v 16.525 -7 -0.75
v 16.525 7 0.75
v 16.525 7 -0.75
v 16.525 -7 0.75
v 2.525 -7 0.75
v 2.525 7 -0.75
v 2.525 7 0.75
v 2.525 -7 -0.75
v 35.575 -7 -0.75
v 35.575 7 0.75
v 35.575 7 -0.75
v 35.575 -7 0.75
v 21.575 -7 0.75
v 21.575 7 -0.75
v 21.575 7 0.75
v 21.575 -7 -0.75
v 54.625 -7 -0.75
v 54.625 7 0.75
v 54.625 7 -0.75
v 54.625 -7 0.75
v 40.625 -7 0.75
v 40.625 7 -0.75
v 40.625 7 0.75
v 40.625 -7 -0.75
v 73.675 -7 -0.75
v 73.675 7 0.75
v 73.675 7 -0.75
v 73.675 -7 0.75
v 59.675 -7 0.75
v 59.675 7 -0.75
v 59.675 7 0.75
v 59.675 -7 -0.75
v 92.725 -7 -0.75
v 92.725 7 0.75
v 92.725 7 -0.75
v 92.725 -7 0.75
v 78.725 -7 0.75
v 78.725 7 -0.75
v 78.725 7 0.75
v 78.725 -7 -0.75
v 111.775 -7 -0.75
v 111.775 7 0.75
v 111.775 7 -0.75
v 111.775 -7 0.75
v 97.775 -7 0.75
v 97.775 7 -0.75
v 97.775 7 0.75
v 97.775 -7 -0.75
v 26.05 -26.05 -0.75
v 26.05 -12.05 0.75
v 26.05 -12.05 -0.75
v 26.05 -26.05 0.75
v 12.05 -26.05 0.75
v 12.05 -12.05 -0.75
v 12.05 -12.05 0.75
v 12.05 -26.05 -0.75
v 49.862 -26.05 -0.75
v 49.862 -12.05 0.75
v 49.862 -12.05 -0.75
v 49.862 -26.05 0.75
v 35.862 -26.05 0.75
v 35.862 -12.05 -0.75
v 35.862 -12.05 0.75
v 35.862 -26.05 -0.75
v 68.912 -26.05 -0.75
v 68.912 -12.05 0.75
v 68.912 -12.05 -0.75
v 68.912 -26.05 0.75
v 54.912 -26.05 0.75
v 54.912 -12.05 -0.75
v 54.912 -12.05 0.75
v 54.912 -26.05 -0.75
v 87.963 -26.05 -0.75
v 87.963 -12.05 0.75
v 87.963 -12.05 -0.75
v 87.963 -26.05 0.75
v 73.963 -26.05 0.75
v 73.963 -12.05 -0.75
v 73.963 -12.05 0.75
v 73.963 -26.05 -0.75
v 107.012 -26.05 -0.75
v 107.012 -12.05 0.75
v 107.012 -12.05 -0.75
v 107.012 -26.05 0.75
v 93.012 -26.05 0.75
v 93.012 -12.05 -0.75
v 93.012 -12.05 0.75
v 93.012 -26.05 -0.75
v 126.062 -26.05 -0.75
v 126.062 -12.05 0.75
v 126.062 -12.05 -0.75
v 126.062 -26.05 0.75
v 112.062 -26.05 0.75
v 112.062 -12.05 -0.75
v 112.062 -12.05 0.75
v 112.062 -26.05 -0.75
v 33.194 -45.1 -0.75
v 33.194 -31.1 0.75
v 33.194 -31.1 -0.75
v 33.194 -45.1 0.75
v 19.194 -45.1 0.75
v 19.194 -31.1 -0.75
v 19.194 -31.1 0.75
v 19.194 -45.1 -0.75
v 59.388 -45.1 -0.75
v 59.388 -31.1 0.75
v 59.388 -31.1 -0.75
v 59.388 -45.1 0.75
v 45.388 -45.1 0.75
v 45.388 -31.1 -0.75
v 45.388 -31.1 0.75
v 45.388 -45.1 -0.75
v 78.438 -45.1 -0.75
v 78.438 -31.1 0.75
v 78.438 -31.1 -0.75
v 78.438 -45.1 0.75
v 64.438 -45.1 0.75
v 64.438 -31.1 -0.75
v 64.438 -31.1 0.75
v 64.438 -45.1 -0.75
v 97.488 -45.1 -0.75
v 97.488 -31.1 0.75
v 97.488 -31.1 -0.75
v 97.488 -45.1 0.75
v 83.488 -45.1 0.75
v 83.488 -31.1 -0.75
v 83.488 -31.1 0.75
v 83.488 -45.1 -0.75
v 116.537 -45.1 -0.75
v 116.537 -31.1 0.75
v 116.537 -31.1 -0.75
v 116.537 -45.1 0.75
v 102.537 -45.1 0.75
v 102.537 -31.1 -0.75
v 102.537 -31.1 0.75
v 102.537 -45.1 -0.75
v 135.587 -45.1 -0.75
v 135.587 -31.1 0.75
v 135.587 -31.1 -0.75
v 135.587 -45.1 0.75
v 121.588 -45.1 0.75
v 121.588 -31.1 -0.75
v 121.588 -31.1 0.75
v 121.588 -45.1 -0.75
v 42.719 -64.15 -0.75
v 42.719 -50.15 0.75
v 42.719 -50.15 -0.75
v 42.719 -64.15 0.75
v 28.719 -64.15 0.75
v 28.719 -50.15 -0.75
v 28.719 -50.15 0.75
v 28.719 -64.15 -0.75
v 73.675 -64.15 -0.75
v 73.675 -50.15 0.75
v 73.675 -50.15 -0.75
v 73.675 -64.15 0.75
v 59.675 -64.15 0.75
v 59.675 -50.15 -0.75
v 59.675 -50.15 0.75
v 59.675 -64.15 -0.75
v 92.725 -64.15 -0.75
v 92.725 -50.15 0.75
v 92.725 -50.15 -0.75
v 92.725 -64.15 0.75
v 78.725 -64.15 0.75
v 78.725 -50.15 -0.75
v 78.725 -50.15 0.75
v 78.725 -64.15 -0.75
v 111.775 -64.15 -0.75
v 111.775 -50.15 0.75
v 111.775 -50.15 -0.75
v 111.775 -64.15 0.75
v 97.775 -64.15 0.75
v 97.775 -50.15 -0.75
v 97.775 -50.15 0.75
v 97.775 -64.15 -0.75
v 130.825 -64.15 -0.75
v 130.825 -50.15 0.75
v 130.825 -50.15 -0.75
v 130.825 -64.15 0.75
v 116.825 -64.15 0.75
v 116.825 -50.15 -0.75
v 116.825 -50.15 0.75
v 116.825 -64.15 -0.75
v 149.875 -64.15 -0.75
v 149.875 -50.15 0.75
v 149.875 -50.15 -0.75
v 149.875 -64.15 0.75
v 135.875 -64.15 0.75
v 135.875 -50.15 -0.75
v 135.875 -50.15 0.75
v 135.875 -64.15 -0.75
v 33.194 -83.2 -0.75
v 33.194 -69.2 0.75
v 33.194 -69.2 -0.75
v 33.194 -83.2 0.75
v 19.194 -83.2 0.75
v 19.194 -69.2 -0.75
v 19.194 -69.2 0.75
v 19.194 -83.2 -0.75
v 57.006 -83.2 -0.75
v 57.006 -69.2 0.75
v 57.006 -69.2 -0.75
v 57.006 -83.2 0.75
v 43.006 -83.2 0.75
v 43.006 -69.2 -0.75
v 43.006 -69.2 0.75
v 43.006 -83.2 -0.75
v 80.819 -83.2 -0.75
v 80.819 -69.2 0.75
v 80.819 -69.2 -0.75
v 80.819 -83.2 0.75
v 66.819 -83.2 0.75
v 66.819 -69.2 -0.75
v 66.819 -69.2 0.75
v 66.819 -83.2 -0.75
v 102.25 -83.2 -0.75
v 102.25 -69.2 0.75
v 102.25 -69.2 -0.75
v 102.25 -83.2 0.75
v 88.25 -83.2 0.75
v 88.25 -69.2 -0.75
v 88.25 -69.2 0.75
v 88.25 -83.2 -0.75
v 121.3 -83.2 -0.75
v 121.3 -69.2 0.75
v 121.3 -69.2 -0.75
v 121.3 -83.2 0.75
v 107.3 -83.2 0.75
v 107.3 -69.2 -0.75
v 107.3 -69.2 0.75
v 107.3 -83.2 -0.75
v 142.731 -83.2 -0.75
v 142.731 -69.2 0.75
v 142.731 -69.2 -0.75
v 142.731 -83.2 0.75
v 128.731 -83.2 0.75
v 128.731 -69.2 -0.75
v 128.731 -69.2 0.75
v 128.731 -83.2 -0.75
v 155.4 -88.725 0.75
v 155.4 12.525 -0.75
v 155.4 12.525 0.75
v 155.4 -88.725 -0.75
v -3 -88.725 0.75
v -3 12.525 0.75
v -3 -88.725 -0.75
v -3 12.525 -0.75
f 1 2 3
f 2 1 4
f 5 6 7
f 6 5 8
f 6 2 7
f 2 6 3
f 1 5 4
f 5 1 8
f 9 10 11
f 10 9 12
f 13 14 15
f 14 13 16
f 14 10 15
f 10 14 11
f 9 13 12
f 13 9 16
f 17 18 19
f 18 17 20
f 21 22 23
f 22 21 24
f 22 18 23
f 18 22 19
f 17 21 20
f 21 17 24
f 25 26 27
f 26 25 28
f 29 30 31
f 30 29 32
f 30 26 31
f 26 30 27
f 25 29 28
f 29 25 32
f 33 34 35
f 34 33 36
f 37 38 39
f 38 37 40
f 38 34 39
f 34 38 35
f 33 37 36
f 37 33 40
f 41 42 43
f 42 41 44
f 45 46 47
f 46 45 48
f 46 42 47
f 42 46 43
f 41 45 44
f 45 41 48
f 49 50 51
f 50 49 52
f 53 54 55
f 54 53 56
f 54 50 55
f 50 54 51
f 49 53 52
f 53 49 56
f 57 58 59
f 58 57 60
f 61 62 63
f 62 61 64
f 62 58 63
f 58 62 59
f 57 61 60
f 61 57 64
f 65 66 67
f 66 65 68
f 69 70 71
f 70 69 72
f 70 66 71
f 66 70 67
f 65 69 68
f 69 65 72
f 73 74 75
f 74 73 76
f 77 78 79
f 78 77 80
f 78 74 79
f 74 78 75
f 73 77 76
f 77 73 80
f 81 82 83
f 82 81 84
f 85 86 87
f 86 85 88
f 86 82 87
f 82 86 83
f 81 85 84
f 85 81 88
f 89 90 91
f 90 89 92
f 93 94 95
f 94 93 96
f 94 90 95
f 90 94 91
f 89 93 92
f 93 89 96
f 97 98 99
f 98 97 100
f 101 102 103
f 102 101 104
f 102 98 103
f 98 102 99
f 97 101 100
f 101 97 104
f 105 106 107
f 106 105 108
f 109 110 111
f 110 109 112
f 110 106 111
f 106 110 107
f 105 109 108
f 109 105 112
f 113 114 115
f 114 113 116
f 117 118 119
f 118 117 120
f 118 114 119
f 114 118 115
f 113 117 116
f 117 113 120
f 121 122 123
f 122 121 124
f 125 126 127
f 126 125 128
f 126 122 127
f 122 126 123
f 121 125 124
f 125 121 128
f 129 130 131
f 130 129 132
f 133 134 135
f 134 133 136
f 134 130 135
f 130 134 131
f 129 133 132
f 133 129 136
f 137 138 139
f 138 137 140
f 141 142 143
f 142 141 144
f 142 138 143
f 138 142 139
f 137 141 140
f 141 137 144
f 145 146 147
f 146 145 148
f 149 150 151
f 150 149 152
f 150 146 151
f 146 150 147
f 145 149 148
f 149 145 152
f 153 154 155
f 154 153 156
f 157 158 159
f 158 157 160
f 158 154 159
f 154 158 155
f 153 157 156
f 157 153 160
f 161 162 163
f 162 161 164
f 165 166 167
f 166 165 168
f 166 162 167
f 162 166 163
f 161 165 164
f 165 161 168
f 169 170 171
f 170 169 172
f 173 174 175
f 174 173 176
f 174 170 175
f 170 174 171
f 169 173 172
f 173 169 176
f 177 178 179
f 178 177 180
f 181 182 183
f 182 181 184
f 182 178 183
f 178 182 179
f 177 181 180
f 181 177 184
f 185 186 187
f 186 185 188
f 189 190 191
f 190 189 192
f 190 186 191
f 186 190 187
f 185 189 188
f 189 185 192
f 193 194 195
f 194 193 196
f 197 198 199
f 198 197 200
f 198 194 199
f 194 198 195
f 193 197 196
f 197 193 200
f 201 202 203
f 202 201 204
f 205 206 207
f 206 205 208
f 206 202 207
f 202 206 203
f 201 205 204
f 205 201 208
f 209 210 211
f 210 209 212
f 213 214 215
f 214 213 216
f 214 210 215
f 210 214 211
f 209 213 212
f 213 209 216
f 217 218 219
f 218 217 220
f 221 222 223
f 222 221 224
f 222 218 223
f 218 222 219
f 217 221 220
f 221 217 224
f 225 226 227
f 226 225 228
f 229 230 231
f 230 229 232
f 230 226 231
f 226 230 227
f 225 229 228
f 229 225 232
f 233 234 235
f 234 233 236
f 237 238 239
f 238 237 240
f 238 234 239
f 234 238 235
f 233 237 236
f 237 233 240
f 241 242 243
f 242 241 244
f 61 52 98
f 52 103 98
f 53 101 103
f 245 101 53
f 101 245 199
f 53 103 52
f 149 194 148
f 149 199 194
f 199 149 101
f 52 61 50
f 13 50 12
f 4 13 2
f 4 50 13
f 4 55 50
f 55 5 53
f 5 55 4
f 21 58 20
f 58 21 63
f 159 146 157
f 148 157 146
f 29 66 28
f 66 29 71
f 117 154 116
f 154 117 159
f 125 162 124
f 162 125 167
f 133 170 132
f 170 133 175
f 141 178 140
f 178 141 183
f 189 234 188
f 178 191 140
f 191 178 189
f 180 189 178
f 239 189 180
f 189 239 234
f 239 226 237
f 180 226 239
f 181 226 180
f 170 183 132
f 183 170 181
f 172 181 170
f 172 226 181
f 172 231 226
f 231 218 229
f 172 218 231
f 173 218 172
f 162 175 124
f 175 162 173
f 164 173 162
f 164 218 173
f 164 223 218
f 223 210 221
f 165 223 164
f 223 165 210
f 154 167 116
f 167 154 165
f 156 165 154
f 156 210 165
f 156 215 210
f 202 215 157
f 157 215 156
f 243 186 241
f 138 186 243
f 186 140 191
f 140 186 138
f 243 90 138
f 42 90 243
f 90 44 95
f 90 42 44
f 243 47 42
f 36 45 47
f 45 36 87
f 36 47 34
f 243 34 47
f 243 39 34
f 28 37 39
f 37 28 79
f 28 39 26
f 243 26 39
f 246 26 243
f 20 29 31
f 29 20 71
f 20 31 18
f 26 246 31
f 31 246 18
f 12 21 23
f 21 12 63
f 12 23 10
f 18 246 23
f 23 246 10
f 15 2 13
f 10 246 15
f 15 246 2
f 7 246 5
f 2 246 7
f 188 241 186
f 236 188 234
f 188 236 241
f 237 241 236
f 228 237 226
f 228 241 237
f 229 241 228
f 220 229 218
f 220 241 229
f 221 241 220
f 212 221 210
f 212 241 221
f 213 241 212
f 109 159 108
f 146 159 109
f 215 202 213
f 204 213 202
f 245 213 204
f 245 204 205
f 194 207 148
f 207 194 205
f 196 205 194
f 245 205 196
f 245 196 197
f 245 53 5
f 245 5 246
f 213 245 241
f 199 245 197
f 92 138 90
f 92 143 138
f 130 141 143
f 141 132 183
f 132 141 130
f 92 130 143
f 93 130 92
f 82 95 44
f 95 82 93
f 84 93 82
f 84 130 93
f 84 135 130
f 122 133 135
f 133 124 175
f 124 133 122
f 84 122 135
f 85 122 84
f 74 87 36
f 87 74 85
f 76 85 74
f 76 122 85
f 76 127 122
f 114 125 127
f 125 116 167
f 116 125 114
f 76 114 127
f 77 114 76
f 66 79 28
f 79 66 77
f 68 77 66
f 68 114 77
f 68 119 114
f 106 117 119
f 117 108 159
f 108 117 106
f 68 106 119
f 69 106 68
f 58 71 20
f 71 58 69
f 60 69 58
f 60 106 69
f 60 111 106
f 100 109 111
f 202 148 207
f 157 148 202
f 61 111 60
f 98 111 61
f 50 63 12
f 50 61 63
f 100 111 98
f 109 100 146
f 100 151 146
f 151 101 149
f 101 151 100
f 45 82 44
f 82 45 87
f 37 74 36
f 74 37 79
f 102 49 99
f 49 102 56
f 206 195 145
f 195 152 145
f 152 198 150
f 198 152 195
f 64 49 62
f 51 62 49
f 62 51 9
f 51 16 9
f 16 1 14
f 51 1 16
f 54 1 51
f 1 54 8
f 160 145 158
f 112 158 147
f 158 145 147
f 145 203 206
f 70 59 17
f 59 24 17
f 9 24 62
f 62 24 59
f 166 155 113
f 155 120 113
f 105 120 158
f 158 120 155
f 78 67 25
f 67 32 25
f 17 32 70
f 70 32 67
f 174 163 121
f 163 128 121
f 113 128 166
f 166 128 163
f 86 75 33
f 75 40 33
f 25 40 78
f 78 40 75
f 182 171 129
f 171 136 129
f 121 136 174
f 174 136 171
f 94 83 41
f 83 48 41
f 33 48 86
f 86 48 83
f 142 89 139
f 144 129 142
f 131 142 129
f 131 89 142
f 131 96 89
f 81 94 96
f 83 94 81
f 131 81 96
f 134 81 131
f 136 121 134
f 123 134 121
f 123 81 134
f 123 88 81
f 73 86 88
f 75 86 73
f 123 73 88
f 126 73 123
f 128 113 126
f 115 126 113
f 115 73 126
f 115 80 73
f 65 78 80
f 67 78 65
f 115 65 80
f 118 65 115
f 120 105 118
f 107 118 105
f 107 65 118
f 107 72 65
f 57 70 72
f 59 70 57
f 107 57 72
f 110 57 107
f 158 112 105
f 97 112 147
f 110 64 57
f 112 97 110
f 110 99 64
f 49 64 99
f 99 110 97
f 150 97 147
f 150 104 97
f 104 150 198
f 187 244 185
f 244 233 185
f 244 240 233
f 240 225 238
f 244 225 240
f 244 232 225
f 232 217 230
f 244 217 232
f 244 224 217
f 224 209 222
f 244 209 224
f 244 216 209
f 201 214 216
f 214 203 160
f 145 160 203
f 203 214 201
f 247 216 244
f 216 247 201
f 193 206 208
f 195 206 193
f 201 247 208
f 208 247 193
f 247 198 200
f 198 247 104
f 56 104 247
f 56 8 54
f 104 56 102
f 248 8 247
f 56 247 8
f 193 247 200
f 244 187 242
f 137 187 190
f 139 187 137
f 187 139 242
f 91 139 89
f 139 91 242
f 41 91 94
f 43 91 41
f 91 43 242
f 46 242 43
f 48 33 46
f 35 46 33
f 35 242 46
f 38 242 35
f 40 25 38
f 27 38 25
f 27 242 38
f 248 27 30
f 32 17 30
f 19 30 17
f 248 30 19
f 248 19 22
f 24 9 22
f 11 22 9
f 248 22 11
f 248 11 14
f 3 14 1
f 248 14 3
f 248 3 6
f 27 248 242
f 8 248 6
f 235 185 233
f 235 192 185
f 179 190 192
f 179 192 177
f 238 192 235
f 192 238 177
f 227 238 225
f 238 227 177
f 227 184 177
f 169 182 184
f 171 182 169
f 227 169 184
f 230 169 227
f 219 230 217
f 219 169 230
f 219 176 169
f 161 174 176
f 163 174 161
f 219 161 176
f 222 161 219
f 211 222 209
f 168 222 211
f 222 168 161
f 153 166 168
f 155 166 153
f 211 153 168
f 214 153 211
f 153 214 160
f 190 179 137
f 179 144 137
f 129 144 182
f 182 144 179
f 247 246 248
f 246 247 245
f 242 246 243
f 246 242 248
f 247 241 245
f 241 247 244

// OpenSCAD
// Generated by SolidPython 1.1.3 on 2025-04-22 16:12:46


difference() {
	translate(v = [-3.0000000000, -88.7250000000, -0.7500000000]) {
		cube(size = [158.4000000000, 101.2500000000, 1.5000000000]);
	}
	union() {
		translate(v = [9.5250000000, 0.0000000000, 0]) {
			cube(center = true, size = [14.0000000000, 14.0000000000, 4.5000000000]);
		}
		translate(v = [28.5750000000, 0.0000000000, 0]) {
			cube(center = true, size = [14.0000000000, 14.0000000000, 4.5000000000]);
		}
		translate(v = [47.6250000000, 0.0000000000, 0]) {
			cube(center = true, size = [14.0000000000, 14.0000000000, 4.5000000000]);
		}
		translate(v = [66.6750000000, 0.0000000000, 0]) {
			cube(center = true, size = [14.0000000000, 14.0000000000, 4.5000000000]);
		}
		translate(v = [85.7250000000, 0.0000000000, 0]) {
			cube(center = true, size = [14.0000000000, 14.0000000000, 4.5000000000]);
		}
		translate(v = [104.7750000000, 0.0000000000, 0]) {
			cube(center = true, size = [14.0000000000, 14.0000000000, 4.5000000000]);
		}
		translate(v = [19.0500000000, -19.0500000000, 0]) {
			cube(center = true, size = [14.0000000000, 14.0000000000, 4.5000000000]);
		}
		translate(v = [42.8625000000, -19.0500000000, 0]) {
			cube(center = true, size = [14.0000000000, 14.0000000000, 4.5000000000]);
		}
		translate(v = [61.9125000000, -19.0500000000, 0]) {
			cube(center = true, size = [14.0000000000, 14.0000000000, 4.5000000000]);
		}
		translate(v = [80.9625000000, -19.0500000000, 0]) {
			cube(center = true, size = [14.0000000000, 14.0000000000, 4.5000000000]);
		}
		translate(v = [100.0125000000, -19.0500000000, 0]) {
			cube(center = true, size = [14.0000000000, 14.0000000000, 4.5000000000]);
		}
		translate(v = [119.0625000000, -19.0500000000, 0]) {
			cube(center = true, size = [14.0000000000, 14.0000000000, 4.5000000000]);
		}
		translate(v = [26.1937500000, -38.1000000000, 0]) {
			cube(center = true, size = [14.0000000000, 14.0000000000, 4.5000000000]);
		}
		translate(v = [52.3875000000, -38.1000000000, 0]) {
			cube(center = true, size = [14.0000000000, 14.0000000000, 4.5000000000]);
		}
		translate(v = [71.4375000000, -38.1000000000, 0]) {
			cube(center = true, size = [14.0000000000, 14.0000000000, 4.5000000000]);
		}
		translate(v = [90.4875000000, -38.1000000000, 0]) {
			cube(center = true, size = [14.0000000000, 14.0000000000, 4.5000000000]);
		}
		translate(v = [109.5375000000, -38.1000000000, 0]) {
			cube(center = true, size = [14.0000000000, 14.0000000000, 4.5000000000]);
		}
		translate(v = [128.5875000000, -38.1000000000, 0]) {
			cube(center = true, size = [14.0000000000, 14.0000000000, 4.5000000000]);
		}
		translate(v = [35.7187500000, -57.1500000000, 0]) {
			cube(center = true, size = [14.0000000000, 14.0000000000, 4.5000000000]);
		}
		translate(v = [66.6750000000, -57.1500000000, 0]) {
			cube(center = true, size = [14.0000000000, 14.0000000000, 4.5000000000]);
		}
		translate(v = [85.7250000000, -57.1500000000, 0]) {
			cube(center = true, size = [14.0000000000, 14.0000000000, 4.5000000000]);
		}
		translate(v = [104.7750000000, -57.1500000000, 0]) {
			cube(center = true, size = [14.0000000000, 14.0000000000, 4.5000000000]);
		}
		translate(v = [123.8250000000, -57.1500000000, 0]) {
			cube(center = true, size = [14.0000000000, 14.0000000000, 4.5000000000]);
		}
		translate(v = [142.8750000000, -57.1500000000, 0]) {
			cube(center = true, size = [14.0000000000, 14.0000000000, 4.5000000000]);
		}
		translate(v = [26.1937500000, -76.2000000000, 0]) {
			cube(center = true, size = [14.0000000000, 14.0000000000, 4.5000000000]);
		}
		translate(v = [50.0062500000, -76.2000000000, 0]) {
			cube(center = true, size = [14.0000000000, 14.0000000000, 4.5000000000]);
		}
		translate(v = [73.8187500000, -76.2000000000, 0]) {
			cube(center = true, size = [14.0000000000, 14.0000000000, 4.5000000000]);
		}
		translate(v = [95.2500000000, -76.2000000000, 0]) {
			cube(center = true, size = [14.0000000000, 14.0000000000, 4.5000000000]);
		}
		translate(v = [114.3000000000, -76.2000000000, 0]) {
			cube(center = true, size = [14.0000000000, 14.0000000000, 4.5000000000]);
		}
		translate(v = [135.7312500000, -76.2000000000, 0]) {
			cube(center = true, size = [14.0000000000, 14.0000000000, 4.5000000000]);
		}
	}
}
/***********************************************
*********      SolidPython code:      **********
************************************************
 
#! /usr/bin/env python
# -*- coding: utf-8 -*-

from solid import *
from solid.utils import *

# ==========================
# Configuration
# ==========================

# --- Basic Units ---
U = 19.05  # Standard key unit size in mm
KEY_CUTOUT_SIZE = 14.0  # Size of the square hole for the switch
PLATE_THICKNESS = 1.5  # Thickness of the plate in mm

# --- Plate Design ---
PLATE_BORDER = 3.0  # Extra border around the outermost keys in mm
# INTER_HALF_SPACING is no longer needed as files are separate

# --- Layout Definition (Key Widths in U units) ---
# Define the layout for each half. Each inner list is a row.
# Modify these lists to match your desired 60% split layout.
# This example uses a 5x6 grid per side with common modifier widths.
left_layout_u = [
    [1,   1,    1,    1,    1,    1   ],  # Row 0 (Top: Esc, 1-5)
    [1.5, 1,    1,    1,    1,    1   ],  # Row 1 (Tab, QWERT)
    [1.75,1,    1,    1,    1,    1   ],  # Row 2 (Caps, ASDFG)
    [2.25,1,    1,    1,    1,    1   ],  # Row 3 (Shift, ZXCVB)
    [1.25,1.25, 1.25, 1,    1,    1.25],  # Row 4 (Bottom Mods/Thumb - Customize as needed)
]

right_layout_u = [
    [1,    1,    1,    1,    1,    1   ],  # Row 0 (Top: 6-0, -)
    [1,    1,    1,    1,    1,    1.5 ],  # Row 1 (YUIOP, Bksp)
    [1,    1,    1,    1,    1,    1.75],  # Row 2 (HJKL;, Enter)
    [1,    1,    1,    1,    1,    2.25],  # Row 3 (NM,./, Shift)
    [1.25, 1,    1,    1.25, 1.25, 1.25],  # Row 4 (Bottom Mods/Thumb - Customize as needed)
]

# --- Stagger Definition (Offset per row in U units) ---
# Standard QWERTY-like stagger (relative to Row 0)
stagger_offsets_u = [
    0.0,   # Row 0 (Number row)
    0.25,  # Row 1 (QWERTY row)
    0.5,   # Row 2 (ASDF row)
    0.75,  # Row 3 (ZXCV row)
    0.75   # Row 4 (Bottom/Thumb row - often customized, adjust if needed)
]

# ==========================
# Helper Functions
# ==========================

def key_cutout():
    """ Creates the 14x14mm negative space for a single switch cutout. """
    # Make it slightly taller than the plate for clean subtraction
    return cube([KEY_CUTOUT_SIZE, KEY_CUTOUT_SIZE, PLATE_THICKNESS * 3], center=True)

def generate_half_plate(layout_u, stagger_u, name="half"):
    """ Generates one half of the split keyboard plate. """
    print(f"Generating plate half: {name}")
    all_cutouts = []
    key_bounding_boxes = [] # Store tuples: (min_x, max_x, min_y, max_y) for each key position

    origin_y = 0 # Start placing rows from Y=0 downwards

    for r, row_layout in enumerate(layout_u):
        row_y = origin_y - (r * U) # Y position for the center of the current row
        row_stagger = stagger_u[r] * U if r < len(stagger_u) else 0
        current_x = row_stagger # Start x-position for the row, including stagger

        for key_width_u in row_layout:
            key_width = key_width_u * U
            # Calculate the center position of the current key
            key_center_x = current_x + (key_width / 2)
            key_center_y = row_y

            # --- Create and position the cutout ---
            cutout_obj = translate([key_center_x, key_center_y, 0])(key_cutout())
            all_cutouts.append(cutout_obj)

            # --- Calculate bounding box for this key's overall space ---
            # This helps determine the overall plate size
            key_min_x = current_x
            key_max_x = current_x + key_width
            key_min_y = row_y - (U / 2)
            key_max_y = row_y + (U / 2)
            key_bounding_boxes.append((key_min_x, key_max_x, key_min_y, key_max_y))

            # --- Advance x for the next key in the row ---
            current_x += key_width

    if not key_bounding_boxes:
        print(f"Warning: No keys found for half '{name}'. Returning empty object.")
        return union() # Return empty object

    # --- Determine overall plate dimensions ---
    min_x = min(box[0] for box in key_bounding_boxes) - PLATE_BORDER
    max_x = max(box[1] for box in key_bounding_boxes) + PLATE_BORDER
    min_y = min(box[2] for box in key_bounding_boxes) - PLATE_BORDER
    max_y = max(box[3] for box in key_bounding_boxes) + PLATE_BORDER

    plate_width = max_x - min_x
    plate_height = max_y - min_y
    plate_center_x = (min_x + max_x) / 2
    plate_center_y = (min_y + max_y) / 2

    print(f" - Plate Dimensions ({name}): Width={plate_width:.2f}, Height={plate_height:.2f}")
    print(f" - Plate Center ({name}): X={plate_center_x:.2f}, Y={plate_center_y:.2f}")

    # --- Create the base plate solid ---
    # Center the plate geometry around its calculated center before returning,
    # so that the final object's origin (0,0,0) corresponds to its geometric center.
    # However, for separate plates, it might be more useful to have the origin
    # consistently placed, e.g., at the top-left corner or relative to the first key.
    # Let's keep it centered for now, it's often easier to handle in slicers.
    base_plate = translate([plate_center_x, plate_center_y, 0])(
        cube([plate_width, plate_height, PLATE_THICKNESS], center=True)
    )

    # --- Subtract the key cutouts ---
    # Need to translate the cutouts relative to the plate's center as well.
    # Alternatively, create the plate at the origin and translate it later.
    # Let's rebuild the plate relative to (0,0) based on min/max values
    # and then translate the cutouts relative to that origin. This makes
    # the final object's origin predictable (related to min_x, max_y).

    base_plate_origin = translate([min_x, min_y, -PLATE_THICKNESS/2])(
         cube([plate_width, plate_height, PLATE_THICKNESS])
    )
    # Adjust cutouts to be relative to this new plate origin if needed,
    # but since they were calculated in absolute coords based on key positions,
    # they should subtract correctly from the base_plate_origin created using
    # the same min/max coordinates. Let's test this simpler approach first.

    plate_half = difference()(
        base_plate_origin, # Plate defined from min_x, min_y
        union()(all_cutouts) # Cutouts are already in the correct absolute positions
    )


    # Optional: Translate the final half so its corner is nearer the origin (0,0)
    # plate_half = translate([-min_x, -min_y, 0])(plate_half)

    return plate_half

# ==========================
# Main Execution
# ==========================

if __name__ == '__main__':
    # Generate the left half
    left_half = generate_half_plate(left_layout_u, stagger_offsets_u, "Left")

    # Generate the right half
    right_half = generate_half_plate(right_layout_u, stagger_offsets_u, "Right")

    # --- Output Separate Files ---
    output_filename_left = 'split_plate_left.scad'
    output_filename_right = 'split_plate_right.scad'

    print(f"\nSaving Left Half to {output_filename_left}...")
    scad_render_to_file(left_half, output_filename_left)
    print("Left Half Saved.")

    print(f"Saving Right Half to {output_filename_right}...")
    scad_render_to_file(right_half, output_filename_right)
    print("Right Half Saved.")

    print("\nDone generating separate plate halves.")

    # Optional: STL Rendering (requires OpenSCAD installed and in PATH)
    # try:
    #     print(f"\nAttempting to render STL files (requires OpenSCAD)...")
    #     output_stl_left = 'split_plate_left.stl'
    #     output_stl_right = 'split_plate_right.stl'
    #     scad_render_to_file(left_half, output_stl_left)
    #     print(f" - Saved {output_stl_left}")
    #     scad_render_to_file(right_half, output_stl_right)
    #     print(f" - Saved {output_stl_right}")
    #     print("STL rendering successful.")
    # except Exception as e:
    #     print(f"STL rendering failed. Ensure OpenSCAD is installed and in your system's PATH.")
    #     print(f"Error: {e}") 
 
************************************************/
